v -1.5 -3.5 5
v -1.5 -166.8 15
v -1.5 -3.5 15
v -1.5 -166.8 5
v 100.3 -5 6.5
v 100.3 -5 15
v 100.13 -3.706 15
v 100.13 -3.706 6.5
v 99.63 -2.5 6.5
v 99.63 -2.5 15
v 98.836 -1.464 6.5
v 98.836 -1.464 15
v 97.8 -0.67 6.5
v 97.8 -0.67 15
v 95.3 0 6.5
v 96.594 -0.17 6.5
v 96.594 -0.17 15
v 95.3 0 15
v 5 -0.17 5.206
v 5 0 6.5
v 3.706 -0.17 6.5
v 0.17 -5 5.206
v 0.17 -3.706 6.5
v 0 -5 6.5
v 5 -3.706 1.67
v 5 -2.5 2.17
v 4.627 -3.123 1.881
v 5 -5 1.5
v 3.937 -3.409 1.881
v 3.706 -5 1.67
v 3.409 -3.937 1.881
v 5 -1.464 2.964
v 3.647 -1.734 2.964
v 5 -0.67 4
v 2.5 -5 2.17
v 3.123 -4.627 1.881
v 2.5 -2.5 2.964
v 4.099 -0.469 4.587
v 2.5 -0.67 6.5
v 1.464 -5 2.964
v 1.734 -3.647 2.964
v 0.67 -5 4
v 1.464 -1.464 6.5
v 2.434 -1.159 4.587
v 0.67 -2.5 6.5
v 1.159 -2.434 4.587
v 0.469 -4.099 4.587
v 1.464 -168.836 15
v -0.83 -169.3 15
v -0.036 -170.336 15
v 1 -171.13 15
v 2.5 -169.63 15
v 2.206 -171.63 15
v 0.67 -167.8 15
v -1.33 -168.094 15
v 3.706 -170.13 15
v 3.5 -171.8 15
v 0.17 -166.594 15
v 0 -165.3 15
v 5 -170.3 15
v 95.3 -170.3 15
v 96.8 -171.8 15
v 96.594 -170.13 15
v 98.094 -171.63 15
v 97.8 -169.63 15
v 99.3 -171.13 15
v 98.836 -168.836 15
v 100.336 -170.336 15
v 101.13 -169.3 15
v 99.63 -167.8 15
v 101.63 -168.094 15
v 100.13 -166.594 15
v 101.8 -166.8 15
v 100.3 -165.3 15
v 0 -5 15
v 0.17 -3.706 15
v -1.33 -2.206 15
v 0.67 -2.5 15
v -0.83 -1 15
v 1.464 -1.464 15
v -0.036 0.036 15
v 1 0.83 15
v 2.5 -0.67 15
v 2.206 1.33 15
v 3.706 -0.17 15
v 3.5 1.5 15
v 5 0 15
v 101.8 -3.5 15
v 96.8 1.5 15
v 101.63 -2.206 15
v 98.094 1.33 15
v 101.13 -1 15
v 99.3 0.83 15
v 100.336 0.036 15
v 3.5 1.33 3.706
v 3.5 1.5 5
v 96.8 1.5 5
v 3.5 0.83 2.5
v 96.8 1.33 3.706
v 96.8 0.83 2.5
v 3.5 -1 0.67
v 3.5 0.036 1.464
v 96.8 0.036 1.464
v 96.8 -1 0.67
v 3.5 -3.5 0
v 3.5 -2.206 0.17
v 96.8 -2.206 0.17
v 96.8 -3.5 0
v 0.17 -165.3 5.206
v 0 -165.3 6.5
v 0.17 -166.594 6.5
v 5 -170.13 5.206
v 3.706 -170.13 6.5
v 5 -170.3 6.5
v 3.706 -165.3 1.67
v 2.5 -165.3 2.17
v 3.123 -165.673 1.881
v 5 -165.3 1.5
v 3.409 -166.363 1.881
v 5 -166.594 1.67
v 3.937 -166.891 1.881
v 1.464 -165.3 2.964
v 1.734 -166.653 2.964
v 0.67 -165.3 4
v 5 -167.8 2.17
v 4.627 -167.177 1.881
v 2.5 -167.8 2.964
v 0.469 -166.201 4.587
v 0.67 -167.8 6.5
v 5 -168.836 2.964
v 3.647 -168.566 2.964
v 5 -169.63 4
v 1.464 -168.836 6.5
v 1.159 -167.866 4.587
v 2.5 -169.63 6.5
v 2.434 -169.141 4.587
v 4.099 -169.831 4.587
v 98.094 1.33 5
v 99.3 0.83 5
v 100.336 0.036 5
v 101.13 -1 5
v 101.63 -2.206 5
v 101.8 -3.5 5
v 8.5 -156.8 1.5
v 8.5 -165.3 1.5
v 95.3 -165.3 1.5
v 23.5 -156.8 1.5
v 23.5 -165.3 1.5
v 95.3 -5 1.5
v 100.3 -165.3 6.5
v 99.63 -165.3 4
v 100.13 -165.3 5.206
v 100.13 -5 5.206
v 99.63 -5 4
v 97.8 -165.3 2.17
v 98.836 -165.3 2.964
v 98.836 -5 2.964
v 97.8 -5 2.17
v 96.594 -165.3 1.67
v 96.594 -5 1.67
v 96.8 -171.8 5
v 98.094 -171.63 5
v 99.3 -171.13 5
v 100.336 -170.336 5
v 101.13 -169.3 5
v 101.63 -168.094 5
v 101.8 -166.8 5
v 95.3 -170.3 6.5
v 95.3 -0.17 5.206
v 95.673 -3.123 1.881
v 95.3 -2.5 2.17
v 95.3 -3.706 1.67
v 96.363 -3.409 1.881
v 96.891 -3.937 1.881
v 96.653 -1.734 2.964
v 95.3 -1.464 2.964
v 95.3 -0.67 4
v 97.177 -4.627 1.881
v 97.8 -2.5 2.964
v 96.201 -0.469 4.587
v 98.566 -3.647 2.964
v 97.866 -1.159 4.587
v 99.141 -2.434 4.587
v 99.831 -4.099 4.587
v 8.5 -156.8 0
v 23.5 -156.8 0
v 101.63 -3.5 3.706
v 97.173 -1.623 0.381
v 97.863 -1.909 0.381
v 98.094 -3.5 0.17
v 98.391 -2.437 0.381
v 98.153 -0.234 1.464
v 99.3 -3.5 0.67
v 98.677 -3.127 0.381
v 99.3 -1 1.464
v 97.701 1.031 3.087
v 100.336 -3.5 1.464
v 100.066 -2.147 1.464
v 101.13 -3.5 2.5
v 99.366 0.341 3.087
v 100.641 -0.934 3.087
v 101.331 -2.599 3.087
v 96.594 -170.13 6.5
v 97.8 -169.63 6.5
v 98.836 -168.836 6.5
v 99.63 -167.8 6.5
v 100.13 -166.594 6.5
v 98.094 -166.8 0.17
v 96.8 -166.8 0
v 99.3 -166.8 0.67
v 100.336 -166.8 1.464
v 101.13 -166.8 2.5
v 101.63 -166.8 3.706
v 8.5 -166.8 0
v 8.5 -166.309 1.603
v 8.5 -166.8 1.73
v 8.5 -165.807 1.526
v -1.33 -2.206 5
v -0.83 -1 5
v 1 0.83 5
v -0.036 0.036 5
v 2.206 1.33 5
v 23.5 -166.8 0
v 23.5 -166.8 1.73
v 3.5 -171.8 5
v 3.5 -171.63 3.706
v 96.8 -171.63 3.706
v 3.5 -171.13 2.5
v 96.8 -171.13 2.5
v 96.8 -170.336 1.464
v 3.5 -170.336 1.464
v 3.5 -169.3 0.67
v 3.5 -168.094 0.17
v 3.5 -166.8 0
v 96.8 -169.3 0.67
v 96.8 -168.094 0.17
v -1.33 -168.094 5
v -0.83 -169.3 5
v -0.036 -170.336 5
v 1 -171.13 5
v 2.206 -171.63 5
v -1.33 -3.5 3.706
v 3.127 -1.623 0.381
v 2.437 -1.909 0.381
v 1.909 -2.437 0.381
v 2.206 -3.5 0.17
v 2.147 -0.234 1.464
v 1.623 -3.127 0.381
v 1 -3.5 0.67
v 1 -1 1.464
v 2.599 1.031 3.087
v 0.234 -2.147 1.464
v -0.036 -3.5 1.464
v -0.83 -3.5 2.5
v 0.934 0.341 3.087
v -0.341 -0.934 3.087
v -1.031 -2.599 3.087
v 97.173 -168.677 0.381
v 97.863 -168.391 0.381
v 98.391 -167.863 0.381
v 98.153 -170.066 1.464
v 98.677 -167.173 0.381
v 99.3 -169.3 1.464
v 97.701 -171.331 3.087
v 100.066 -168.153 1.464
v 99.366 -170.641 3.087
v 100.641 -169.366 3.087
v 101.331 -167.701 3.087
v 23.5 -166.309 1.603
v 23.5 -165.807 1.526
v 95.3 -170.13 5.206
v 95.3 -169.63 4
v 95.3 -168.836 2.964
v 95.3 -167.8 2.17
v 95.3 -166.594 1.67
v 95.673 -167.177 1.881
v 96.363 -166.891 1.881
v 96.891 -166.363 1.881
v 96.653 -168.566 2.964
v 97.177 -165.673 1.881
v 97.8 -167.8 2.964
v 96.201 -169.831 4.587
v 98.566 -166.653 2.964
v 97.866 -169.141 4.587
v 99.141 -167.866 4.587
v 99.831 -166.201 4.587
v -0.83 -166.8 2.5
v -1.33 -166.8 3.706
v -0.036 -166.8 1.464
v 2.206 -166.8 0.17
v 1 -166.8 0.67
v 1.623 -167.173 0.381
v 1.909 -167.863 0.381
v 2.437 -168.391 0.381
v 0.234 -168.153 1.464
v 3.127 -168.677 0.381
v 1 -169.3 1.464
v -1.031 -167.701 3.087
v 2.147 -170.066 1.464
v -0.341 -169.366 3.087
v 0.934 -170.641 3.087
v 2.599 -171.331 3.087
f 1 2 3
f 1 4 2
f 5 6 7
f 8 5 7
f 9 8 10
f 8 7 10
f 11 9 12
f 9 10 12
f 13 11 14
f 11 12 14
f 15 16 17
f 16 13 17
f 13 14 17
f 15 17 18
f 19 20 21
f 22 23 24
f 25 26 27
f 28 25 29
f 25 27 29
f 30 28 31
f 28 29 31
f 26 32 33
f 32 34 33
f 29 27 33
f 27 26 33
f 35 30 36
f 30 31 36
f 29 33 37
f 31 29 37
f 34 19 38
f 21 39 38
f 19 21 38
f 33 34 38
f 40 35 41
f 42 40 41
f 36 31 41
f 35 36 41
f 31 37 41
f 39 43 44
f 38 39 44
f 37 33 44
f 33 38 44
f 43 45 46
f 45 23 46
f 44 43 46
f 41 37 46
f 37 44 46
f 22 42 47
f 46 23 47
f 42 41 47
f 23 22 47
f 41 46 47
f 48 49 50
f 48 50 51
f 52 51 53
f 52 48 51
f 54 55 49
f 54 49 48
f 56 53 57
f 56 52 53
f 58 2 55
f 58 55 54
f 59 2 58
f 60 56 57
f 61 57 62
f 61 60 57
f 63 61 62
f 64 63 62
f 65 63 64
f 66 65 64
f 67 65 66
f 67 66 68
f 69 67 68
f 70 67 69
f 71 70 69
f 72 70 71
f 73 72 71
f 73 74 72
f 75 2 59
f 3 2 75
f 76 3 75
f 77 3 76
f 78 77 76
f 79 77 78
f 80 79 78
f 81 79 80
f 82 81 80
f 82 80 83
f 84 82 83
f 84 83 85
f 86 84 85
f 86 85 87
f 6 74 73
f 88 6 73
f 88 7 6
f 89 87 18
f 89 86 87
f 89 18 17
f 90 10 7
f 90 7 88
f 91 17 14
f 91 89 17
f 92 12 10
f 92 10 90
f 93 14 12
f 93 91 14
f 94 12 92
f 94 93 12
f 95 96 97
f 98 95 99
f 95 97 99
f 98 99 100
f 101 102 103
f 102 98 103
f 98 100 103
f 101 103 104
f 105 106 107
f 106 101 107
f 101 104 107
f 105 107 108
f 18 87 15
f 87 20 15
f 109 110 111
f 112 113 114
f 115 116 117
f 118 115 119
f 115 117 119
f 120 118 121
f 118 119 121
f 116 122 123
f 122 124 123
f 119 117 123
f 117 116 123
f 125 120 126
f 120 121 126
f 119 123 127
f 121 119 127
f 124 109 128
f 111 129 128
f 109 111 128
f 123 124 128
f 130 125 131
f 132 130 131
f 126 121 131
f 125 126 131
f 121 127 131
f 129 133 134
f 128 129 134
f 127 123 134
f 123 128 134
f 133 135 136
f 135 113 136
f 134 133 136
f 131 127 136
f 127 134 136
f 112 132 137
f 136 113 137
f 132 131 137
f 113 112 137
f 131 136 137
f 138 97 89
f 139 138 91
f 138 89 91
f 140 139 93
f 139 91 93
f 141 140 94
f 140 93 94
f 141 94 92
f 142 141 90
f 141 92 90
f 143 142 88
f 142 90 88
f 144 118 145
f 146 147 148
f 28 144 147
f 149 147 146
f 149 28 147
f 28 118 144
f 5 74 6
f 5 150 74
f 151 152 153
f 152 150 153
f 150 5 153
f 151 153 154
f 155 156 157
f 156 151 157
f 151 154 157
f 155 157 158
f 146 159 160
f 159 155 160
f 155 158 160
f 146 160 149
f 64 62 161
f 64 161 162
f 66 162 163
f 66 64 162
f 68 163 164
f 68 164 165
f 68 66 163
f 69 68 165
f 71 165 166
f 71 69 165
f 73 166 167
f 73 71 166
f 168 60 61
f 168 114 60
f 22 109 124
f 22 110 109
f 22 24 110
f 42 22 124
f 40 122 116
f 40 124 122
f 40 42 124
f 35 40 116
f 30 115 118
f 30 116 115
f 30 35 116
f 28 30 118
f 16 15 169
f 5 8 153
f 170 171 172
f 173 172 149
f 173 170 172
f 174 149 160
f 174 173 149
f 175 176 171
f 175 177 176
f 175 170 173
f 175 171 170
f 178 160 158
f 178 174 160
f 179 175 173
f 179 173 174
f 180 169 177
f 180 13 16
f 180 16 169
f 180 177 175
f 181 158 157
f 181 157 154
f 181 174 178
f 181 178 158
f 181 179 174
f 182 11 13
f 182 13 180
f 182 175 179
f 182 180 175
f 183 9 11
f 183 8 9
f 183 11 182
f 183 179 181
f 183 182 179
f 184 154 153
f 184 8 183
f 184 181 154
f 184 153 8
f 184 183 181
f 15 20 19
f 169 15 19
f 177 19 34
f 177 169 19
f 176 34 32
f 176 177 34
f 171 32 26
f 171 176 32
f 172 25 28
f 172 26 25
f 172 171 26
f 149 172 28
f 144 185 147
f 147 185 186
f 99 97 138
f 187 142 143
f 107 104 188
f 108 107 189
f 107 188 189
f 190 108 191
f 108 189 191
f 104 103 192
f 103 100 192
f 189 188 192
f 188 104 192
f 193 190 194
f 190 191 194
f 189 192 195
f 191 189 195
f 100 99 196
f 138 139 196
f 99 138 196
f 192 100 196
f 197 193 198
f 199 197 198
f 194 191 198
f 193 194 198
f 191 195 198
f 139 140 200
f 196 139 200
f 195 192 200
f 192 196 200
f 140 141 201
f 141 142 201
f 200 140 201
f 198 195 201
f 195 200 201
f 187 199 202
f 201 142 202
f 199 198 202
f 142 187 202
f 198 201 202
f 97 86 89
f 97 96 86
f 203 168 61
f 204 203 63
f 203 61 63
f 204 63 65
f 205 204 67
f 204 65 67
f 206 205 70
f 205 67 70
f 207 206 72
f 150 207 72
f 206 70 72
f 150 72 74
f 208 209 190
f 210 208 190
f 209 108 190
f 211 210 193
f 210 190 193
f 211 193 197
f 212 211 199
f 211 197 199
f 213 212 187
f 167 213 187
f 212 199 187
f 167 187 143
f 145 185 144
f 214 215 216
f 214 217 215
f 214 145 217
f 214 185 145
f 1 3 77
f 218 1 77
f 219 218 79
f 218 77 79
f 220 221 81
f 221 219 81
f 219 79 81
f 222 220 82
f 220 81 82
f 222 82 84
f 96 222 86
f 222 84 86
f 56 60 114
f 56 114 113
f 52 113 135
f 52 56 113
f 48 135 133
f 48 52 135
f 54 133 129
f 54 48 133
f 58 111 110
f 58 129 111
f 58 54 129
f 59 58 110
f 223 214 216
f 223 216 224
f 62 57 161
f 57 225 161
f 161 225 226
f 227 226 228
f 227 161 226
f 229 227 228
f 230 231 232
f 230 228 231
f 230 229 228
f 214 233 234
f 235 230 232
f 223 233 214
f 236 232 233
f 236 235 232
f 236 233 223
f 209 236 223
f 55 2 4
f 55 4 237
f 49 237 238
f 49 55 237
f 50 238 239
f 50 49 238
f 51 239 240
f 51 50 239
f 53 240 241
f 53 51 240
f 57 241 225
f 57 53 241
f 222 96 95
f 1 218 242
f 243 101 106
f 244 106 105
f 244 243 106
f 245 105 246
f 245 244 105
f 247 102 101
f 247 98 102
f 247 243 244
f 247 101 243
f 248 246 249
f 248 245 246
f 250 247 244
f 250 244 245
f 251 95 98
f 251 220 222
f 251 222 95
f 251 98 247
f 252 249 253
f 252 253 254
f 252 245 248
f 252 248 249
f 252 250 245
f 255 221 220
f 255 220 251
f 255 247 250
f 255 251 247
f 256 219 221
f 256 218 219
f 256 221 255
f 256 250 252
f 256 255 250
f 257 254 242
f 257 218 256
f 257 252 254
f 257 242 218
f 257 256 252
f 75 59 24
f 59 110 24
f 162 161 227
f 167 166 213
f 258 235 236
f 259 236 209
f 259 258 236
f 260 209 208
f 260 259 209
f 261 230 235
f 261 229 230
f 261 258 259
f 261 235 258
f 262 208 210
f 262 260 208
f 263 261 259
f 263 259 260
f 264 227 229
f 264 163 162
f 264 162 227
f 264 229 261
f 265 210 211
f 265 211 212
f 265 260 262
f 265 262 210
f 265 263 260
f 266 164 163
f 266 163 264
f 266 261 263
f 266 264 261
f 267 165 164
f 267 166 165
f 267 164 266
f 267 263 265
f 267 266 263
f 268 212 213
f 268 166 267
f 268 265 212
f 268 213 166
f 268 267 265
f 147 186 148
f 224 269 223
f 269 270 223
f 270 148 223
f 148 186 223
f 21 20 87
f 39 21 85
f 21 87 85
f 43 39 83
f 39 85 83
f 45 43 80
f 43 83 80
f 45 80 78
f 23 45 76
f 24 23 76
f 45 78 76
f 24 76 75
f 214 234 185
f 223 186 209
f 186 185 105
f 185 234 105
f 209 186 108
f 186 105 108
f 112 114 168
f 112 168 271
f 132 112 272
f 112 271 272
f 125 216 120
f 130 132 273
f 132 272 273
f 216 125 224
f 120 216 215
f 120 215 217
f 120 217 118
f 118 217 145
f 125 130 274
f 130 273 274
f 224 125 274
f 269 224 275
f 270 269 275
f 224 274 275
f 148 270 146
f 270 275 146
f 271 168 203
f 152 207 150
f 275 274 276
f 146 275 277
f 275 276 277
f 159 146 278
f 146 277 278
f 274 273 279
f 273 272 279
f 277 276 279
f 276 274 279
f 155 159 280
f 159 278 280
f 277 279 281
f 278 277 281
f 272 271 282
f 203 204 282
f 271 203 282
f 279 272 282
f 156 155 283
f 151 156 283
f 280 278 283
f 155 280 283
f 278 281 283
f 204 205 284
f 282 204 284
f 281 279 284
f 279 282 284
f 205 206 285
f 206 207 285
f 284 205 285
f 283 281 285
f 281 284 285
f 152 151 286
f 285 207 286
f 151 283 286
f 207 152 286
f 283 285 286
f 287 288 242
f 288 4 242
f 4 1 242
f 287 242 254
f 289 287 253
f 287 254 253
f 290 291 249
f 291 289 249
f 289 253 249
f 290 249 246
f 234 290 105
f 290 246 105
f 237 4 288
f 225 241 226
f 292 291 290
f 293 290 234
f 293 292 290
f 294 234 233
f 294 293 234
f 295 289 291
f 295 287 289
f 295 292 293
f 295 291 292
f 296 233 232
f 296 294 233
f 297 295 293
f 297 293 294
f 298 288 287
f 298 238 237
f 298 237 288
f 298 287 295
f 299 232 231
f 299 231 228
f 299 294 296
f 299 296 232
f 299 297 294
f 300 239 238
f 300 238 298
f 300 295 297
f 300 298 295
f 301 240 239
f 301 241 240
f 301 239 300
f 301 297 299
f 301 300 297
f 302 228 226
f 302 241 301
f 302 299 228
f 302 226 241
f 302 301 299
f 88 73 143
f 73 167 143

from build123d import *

# Parameters (mm, degrees)
F0_W     = 100.3
F0_H     = 170.3
F1_DEPTH = 1.5
F0_W_2   = 103.3
F0_H_2   = 173.3
F2_DEPTH = 15
F3_R     = 5
F4_W     = 15
F4_H     = 10
F5_DEPTH = 25


with BuildPart() as f1:
    # F0 (on Top) → F1 (new body)
    with BuildSketch(Plane.XY):
        with Locations((50.15, -85.15)):
            Rectangle(F0_W, F0_H)
    extrude(amount=F1_DEPTH)

    # F0 (on Top) → F2 (join)
    with BuildSketch(Plane.XY):
        with Locations((50.15, -85.15)):
            Rectangle(F0_W_2, F0_H_2)
        with Locations((50.15, -85.15)):
            Rectangle(F0_W, F0_H, mode=Mode.SUBTRACT)
    extrude(amount=F2_DEPTH)

    # F3
    f3_edges = [f1.edges().sort_by_distance(p)[0] for p in [
        (0, 0, 8.25),
        (101.8, 1.5, 7.5),
        (100.3, 0, 8.25),
        (-1.5, 1.5, 7.5),
        (100.3, -170.3, 8.25),
        (-1.5, -171.8, 7.5),
        (0, -170.3, 8.25),
        (101.8, -171.8, 7.5),
        (50.15, 1.5, 0),
        (-1.5, -85.15, 0),
        (50.15, -171.8, 0),
        (101.8, -85.15, 0),
        (50.15, 0, 1.5),
        (0, -85.15, 1.5),
        (50.15, -170.3, 1.5),
        (100.3, -85.15, 1.5),
    ]]
    fillet(f3_edges, radius=F3_R)

    # F4 (on face) → F5 (cut)
    with BuildSketch(Plane(origin=(0, 0, 0), x_dir=(1, 0, 0), z_dir=(0, 0, -1))):
        with Locations((16, 161.8)):
            Rectangle(F4_W, F4_H)
    extrude(amount=-F5_DEPTH, mode=Mode.SUBTRACT)


solid = f1.part
